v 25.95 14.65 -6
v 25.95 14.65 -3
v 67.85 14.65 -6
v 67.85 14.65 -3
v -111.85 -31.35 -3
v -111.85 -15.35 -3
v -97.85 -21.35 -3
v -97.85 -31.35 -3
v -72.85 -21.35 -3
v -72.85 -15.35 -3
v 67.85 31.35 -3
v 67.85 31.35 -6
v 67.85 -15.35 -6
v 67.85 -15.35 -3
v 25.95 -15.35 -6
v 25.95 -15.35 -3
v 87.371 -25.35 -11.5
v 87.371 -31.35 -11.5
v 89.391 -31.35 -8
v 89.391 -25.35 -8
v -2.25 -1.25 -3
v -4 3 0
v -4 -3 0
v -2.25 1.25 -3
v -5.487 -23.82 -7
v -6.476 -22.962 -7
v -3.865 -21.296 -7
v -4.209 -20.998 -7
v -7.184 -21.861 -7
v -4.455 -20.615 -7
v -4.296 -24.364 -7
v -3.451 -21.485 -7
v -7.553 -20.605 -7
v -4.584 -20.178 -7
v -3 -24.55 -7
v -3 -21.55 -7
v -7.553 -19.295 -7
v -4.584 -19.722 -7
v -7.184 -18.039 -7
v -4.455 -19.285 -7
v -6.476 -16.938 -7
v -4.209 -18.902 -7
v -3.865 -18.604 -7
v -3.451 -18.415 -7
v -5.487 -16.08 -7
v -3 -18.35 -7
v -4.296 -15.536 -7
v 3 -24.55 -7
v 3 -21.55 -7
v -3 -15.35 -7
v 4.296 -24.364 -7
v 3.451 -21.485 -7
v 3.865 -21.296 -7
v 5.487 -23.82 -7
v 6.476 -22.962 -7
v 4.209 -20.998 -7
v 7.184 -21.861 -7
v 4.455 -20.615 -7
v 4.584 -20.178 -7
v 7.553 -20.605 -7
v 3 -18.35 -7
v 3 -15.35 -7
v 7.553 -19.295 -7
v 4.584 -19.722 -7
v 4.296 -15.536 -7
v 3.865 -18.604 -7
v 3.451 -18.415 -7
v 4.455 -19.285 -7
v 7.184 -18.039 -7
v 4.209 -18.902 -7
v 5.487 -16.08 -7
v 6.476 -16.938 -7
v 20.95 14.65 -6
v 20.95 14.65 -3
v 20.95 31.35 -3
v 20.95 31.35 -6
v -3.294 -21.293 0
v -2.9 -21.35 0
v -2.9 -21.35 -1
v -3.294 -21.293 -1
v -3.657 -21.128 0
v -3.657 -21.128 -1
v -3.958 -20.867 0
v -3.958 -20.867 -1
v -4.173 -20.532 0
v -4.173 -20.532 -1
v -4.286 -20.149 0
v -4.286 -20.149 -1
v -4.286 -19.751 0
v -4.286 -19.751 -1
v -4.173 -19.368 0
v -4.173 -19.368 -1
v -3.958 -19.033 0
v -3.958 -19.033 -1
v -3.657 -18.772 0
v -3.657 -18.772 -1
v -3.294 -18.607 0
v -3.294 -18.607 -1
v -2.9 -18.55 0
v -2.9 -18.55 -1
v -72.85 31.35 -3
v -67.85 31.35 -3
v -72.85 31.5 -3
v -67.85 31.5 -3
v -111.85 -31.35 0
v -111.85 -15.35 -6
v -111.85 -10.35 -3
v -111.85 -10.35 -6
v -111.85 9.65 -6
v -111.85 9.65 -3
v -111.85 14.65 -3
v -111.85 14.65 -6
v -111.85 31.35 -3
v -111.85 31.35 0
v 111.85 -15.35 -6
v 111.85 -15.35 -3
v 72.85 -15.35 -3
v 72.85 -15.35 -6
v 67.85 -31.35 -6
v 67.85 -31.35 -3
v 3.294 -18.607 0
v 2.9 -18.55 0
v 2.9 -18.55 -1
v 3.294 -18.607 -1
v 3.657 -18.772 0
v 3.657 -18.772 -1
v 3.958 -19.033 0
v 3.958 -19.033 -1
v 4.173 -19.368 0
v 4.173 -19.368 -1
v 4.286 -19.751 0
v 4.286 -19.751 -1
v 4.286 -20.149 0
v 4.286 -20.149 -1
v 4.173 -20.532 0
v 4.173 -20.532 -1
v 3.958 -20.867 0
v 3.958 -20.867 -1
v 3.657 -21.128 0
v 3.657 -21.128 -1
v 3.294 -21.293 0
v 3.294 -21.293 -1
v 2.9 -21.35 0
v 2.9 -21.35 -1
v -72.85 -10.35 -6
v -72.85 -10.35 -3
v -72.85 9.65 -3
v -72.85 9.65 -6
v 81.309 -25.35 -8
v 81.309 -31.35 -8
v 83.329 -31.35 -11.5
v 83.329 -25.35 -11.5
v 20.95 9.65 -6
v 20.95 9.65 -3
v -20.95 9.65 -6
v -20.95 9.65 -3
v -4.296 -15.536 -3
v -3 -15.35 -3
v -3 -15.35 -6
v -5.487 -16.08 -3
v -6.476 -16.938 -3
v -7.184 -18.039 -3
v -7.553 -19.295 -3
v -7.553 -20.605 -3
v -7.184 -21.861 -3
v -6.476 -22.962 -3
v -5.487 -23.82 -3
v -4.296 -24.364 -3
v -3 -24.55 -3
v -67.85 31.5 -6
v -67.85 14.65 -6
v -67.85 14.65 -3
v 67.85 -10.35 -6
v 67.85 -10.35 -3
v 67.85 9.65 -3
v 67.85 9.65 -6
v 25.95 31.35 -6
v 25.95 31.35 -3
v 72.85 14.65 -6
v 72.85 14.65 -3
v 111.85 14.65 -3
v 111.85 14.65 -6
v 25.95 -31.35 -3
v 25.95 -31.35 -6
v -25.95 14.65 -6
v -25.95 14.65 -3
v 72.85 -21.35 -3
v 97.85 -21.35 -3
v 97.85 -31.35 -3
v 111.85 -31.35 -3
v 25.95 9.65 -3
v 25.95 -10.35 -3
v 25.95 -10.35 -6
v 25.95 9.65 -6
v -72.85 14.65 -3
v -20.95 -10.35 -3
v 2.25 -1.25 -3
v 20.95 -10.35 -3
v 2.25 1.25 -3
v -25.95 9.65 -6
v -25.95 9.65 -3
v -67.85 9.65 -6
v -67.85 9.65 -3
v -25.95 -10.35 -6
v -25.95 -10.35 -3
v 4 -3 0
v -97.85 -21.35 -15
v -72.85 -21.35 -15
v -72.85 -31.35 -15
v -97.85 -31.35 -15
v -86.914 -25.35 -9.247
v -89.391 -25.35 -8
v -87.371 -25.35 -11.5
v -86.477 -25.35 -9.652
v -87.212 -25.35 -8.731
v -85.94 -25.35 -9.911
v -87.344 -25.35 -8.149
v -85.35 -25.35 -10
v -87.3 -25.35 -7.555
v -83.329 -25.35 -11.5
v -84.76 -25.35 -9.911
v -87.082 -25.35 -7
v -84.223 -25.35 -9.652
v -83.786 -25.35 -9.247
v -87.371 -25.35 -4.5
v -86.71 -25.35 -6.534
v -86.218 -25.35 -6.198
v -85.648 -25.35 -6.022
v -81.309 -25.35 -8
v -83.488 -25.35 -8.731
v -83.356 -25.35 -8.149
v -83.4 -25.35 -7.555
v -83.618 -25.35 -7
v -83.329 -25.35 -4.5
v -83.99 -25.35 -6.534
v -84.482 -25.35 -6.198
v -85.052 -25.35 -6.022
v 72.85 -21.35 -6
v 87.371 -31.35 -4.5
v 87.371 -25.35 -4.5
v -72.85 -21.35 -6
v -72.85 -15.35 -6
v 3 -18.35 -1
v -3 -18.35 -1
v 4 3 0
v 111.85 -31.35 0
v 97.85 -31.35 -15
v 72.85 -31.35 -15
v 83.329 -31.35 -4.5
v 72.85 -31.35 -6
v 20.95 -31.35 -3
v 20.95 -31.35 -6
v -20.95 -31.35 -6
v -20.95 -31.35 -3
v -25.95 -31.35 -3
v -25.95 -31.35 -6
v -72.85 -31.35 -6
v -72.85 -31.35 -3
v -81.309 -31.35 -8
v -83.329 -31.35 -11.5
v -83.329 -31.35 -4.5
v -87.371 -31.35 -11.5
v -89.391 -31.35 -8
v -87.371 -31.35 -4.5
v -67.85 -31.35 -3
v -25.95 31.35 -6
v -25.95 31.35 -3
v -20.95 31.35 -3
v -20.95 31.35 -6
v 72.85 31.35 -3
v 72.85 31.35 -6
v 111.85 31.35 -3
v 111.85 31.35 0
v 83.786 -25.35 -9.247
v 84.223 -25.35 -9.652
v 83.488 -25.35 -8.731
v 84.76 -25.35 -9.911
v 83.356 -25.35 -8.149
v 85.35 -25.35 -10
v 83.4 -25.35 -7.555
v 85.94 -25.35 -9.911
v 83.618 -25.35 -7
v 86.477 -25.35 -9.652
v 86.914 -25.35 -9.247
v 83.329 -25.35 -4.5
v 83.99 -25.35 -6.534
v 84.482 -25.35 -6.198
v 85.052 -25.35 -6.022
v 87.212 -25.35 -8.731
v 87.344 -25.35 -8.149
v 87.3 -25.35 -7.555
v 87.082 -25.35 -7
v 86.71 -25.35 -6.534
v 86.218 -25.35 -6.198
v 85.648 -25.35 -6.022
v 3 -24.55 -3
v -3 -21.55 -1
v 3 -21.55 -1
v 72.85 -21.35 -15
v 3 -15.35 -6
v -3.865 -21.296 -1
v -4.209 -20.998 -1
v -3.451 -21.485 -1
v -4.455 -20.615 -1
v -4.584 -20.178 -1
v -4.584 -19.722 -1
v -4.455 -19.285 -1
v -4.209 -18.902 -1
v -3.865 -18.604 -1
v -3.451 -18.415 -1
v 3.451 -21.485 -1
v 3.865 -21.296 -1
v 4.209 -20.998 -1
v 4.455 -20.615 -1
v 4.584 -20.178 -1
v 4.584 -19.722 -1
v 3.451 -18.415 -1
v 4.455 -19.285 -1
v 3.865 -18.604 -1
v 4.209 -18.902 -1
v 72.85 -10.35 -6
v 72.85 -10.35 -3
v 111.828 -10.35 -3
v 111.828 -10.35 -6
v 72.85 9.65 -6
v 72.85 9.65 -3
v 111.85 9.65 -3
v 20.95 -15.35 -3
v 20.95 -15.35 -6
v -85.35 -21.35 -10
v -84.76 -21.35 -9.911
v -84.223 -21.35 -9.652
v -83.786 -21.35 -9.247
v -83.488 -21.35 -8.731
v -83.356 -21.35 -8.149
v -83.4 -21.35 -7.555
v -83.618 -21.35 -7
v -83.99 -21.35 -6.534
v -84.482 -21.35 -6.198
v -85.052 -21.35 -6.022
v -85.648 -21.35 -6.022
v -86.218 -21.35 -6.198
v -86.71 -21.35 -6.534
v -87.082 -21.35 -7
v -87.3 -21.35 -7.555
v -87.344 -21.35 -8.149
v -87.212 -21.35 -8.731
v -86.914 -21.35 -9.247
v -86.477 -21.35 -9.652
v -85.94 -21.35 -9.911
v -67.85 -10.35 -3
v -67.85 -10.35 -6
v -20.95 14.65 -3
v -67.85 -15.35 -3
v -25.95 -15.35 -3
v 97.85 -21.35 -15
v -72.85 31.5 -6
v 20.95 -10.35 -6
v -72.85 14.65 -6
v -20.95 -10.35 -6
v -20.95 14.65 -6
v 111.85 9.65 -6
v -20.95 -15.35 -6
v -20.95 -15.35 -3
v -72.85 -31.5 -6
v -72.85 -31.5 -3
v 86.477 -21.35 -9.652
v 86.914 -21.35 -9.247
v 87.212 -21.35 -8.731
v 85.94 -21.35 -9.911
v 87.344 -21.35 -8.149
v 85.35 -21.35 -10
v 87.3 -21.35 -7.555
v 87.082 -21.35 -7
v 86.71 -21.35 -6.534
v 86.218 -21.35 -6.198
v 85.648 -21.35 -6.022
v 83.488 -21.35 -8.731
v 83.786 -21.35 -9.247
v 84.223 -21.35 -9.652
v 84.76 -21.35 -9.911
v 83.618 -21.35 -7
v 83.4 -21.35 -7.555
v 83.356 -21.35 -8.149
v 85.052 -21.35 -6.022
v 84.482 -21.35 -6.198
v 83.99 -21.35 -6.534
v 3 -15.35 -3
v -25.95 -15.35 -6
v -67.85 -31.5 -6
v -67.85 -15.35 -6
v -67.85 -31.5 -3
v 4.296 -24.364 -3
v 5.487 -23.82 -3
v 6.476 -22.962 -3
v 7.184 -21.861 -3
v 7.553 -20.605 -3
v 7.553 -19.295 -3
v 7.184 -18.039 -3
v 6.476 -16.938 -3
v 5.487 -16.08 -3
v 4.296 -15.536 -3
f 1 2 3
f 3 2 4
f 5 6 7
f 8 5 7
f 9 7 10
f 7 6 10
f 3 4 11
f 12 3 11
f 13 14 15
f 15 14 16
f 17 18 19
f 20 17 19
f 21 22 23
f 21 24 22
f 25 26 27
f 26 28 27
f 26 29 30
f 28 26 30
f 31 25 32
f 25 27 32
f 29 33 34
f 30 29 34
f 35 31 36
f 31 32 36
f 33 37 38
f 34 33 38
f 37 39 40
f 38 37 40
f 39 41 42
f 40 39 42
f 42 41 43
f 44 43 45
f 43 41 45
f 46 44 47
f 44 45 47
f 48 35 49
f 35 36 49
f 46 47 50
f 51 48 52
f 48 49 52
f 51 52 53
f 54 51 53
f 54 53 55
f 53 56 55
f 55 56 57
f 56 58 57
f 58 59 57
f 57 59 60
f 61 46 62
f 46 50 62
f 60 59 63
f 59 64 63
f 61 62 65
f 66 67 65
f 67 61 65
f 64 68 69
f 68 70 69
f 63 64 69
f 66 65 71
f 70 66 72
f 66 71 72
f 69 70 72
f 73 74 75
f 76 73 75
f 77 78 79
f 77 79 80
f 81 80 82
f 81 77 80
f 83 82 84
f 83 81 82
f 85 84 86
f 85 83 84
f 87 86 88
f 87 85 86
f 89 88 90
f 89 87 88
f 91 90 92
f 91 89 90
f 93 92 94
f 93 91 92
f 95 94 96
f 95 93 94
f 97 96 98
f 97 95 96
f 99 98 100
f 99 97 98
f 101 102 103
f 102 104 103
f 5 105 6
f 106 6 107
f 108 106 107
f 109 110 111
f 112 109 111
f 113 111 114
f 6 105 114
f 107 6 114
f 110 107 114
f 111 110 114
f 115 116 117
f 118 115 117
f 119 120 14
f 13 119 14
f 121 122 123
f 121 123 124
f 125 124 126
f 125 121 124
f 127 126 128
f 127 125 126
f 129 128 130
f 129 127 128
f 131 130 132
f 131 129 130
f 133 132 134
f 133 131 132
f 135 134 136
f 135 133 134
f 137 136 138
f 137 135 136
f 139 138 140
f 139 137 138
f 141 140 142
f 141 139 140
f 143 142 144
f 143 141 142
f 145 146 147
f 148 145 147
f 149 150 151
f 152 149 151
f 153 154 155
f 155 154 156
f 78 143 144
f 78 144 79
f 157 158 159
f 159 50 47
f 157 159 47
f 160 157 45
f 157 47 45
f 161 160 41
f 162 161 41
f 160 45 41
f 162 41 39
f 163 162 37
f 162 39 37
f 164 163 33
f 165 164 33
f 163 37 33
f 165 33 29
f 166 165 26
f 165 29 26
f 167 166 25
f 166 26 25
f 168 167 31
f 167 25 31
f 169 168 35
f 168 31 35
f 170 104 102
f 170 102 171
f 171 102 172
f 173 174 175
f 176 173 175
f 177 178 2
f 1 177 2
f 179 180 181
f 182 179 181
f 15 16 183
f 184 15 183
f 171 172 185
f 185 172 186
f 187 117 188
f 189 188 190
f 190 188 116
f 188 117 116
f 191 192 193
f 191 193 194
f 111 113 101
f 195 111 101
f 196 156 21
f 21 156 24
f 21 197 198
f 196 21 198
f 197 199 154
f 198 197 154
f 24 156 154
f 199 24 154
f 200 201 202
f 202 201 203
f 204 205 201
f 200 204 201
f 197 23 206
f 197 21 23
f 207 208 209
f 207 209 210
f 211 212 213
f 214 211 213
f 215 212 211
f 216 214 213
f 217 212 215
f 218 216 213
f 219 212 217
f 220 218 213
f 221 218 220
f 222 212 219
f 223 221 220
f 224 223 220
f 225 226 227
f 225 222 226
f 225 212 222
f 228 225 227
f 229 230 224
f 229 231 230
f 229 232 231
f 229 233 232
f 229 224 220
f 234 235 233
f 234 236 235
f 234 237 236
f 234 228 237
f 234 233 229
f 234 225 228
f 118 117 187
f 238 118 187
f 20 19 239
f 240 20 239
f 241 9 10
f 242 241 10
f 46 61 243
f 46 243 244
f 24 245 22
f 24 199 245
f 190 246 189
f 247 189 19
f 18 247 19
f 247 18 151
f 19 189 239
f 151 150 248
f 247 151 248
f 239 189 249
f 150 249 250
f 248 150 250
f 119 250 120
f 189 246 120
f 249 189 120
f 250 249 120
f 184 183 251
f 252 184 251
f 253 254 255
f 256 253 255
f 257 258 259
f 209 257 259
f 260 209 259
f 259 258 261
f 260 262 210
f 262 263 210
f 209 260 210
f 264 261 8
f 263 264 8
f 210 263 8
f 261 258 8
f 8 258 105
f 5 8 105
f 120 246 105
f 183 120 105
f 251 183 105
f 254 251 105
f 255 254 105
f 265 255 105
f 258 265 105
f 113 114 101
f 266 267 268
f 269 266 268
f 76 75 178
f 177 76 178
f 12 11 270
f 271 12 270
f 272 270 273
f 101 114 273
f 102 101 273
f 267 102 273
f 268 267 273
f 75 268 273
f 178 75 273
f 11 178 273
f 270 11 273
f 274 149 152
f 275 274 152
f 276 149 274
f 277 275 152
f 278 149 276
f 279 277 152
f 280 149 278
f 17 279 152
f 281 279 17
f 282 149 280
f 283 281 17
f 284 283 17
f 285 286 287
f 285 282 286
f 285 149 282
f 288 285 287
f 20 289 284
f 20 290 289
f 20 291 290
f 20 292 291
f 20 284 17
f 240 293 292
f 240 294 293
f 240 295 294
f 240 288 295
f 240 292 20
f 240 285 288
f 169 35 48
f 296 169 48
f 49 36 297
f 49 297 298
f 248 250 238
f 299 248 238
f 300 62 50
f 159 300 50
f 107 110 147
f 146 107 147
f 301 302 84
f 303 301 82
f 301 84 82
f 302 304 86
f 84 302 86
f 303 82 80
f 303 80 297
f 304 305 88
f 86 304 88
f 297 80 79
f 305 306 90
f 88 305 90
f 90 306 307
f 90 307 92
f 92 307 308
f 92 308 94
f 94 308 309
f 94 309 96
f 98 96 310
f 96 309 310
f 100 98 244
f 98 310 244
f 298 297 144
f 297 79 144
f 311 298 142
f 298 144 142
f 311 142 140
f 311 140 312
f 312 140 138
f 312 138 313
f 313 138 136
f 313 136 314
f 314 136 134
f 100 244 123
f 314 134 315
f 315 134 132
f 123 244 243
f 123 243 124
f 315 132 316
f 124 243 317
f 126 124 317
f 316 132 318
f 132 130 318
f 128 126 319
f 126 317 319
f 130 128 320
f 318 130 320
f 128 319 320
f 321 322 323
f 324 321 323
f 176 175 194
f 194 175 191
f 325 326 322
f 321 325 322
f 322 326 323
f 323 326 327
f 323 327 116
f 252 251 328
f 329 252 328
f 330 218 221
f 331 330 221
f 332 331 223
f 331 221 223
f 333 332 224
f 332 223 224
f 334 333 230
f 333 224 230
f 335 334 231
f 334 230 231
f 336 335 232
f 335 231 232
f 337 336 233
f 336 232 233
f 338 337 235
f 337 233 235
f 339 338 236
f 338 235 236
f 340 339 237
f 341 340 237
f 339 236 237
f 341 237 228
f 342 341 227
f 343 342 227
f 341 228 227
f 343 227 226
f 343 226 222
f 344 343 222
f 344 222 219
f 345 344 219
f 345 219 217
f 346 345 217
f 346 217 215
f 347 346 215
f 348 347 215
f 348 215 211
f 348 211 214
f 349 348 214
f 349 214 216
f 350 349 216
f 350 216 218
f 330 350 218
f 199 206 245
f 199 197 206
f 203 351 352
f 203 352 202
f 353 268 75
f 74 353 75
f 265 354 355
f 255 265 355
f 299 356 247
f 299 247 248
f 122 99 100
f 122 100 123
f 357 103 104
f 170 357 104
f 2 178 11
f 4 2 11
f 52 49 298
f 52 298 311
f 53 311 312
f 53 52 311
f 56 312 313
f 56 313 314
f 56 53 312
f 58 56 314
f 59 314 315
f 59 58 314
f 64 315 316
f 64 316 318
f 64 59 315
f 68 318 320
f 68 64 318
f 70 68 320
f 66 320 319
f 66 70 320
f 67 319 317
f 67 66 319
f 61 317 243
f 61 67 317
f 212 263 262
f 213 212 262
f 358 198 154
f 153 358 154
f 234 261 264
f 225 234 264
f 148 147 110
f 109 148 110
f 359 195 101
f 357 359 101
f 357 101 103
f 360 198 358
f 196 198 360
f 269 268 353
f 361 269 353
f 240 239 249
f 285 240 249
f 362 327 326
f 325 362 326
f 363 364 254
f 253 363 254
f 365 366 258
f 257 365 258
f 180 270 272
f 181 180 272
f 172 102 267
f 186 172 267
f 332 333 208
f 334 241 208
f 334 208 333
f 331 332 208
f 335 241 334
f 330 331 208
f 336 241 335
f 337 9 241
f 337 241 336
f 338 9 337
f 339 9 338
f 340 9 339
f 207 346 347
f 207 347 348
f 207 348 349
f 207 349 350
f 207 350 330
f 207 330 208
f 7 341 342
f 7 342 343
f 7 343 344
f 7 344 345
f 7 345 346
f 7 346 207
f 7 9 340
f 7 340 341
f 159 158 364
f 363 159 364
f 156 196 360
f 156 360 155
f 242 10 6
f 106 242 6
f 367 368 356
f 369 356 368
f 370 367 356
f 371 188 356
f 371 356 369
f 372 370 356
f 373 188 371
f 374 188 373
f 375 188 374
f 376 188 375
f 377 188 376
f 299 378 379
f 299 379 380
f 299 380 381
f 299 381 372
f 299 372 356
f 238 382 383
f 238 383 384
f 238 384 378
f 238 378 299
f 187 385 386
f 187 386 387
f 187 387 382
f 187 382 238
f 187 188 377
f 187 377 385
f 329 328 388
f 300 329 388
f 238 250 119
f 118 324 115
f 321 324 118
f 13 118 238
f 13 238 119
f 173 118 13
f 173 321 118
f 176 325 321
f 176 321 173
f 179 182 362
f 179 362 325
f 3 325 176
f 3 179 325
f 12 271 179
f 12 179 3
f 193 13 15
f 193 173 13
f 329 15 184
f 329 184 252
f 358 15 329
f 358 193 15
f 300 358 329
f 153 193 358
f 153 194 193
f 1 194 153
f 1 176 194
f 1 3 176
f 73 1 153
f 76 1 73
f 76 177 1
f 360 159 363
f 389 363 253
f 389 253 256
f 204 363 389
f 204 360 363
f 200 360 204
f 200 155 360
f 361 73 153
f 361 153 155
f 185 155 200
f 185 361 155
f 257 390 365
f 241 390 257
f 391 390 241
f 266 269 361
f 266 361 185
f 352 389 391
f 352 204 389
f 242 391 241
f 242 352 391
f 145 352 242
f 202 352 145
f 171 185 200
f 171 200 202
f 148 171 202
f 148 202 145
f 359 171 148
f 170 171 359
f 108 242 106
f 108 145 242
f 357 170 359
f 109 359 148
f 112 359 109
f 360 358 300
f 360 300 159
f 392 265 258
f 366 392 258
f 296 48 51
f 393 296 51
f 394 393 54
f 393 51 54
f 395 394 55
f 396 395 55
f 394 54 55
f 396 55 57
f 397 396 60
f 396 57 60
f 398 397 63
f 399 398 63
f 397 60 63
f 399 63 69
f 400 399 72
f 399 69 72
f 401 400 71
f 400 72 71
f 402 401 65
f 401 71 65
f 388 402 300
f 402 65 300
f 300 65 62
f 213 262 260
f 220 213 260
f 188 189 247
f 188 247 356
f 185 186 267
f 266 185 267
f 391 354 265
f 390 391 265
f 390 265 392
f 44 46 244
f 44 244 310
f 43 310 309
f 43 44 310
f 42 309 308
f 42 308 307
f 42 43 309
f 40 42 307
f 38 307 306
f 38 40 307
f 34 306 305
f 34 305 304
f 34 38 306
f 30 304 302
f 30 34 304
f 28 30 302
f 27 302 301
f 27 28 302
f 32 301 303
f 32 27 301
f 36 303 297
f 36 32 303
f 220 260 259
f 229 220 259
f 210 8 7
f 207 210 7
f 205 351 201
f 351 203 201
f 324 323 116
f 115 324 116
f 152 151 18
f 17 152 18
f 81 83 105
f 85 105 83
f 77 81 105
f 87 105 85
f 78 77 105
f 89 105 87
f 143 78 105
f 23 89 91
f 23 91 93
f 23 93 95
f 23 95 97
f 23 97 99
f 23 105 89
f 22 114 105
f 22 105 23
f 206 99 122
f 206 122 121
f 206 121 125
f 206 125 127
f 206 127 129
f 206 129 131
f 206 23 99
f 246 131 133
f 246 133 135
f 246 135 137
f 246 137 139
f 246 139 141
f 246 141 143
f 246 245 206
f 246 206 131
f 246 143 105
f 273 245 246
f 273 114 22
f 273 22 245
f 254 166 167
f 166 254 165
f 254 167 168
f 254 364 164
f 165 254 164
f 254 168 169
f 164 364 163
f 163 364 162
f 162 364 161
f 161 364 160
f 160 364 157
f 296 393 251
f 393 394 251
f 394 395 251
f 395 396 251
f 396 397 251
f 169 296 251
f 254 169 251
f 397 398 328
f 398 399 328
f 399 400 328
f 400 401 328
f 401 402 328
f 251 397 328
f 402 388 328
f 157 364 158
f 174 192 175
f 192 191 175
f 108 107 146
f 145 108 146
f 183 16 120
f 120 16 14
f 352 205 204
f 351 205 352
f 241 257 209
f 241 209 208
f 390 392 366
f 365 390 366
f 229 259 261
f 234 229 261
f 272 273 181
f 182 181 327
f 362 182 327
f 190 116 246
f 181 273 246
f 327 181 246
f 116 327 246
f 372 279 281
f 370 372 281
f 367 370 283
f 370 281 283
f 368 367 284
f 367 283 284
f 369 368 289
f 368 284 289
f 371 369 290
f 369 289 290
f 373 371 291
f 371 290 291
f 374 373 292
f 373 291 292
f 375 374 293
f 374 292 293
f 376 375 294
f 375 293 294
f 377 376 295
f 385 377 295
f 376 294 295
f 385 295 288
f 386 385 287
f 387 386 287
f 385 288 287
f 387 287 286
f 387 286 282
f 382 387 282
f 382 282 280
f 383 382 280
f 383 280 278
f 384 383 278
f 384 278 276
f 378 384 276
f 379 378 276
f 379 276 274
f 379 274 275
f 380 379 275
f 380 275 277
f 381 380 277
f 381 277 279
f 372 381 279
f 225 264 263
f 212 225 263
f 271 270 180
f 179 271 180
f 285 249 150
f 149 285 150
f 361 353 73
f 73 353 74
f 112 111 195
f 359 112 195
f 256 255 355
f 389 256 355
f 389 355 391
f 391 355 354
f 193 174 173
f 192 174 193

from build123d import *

# Parameters (mm, degrees)
SKETCH_1_W          = 223.7
SKETCH_1_H          = 62.7
EXTRUDE_1_DEPTH     = 3
CUT_EXTRUDE_1_DEPTH = 1
CUT_EXTRUDE_3_DEPTH = 2
EXTRUDE_START       = 4
EXTRUDE_1_2_DEPTH   = 4
SKETCH_13_W         = 25
SKETCH_13_H         = 10
EXTRUDE_2_DEPTH     = 12
SKETCH_14_W         = 41.9
SKETCH_14_H         = 19.999967379
EXTRUDE_3_DEPTH     = 3
SKETCH_15_R         = 2
CUT_EXTRUDE_4_DEPTH = 10
CUT_EXTRUDE_5_DEPTH = 6


with BuildPart() as part:
    # 草图1 → Extrude 1 (new body)
    with BuildSketch(Plane.XY):
        Rectangle(SKETCH_1_W, SKETCH_1_H)
    extrude(amount=-EXTRUDE_1_DEPTH)

    # 草图2 → 切除-拉伸1 (cut)
    with BuildSketch(Plane.XY):
        with BuildLine():
            Line((-2.9, -18.55), (2.9, -18.55))
            ThreePointArc((2.9, -18.55), (4.3, -19.95), (2.9, -21.35))
            Line((2.9, -21.35), (-2.9, -21.35))
            ThreePointArc((-2.9, -21.35), (-4.3, -19.95), (-2.9, -18.55))
        make_face()
    extrude(amount=-CUT_EXTRUDE_1_DEPTH, mode=Mode.SUBTRACT)

    # 草图5 → 切除-拉伸3 (cut)
    with BuildSketch(Plane(origin=(0, 0, -3), x_dir=(-1, 0, 0), z_dir=(0, 0, -1))):
        with BuildLine():
            Line((3, -21.55), (-3, -21.55))
            ThreePointArc((-3, -21.55), (-4.6, -19.95), (-3, -18.35))
            Line((-3, -18.35), (3, -18.35))
            ThreePointArc((3, -18.35), (4.6, -19.95), (3, -21.55))
        make_face()
    extrude(amount=-CUT_EXTRUDE_3_DEPTH, mode=Mode.SUBTRACT)

    # 草图5<2> → Extrude 1 2 (add)
    with BuildSketch(Plane(origin=(0, 0, -3), x_dir=(-1, 0, 0), z_dir=(0, 0, -1)).offset(EXTRUDE_START)):
        with BuildLine():
            Line((-3, -15.35), (3, -15.35))
            ThreePointArc((3, -15.35), (7.6, -19.95), (3, -24.55))
            Line((3, -24.55), (-3, -24.55))
            ThreePointArc((-3, -24.55), (-7.6, -19.95), (-3, -15.35))
        make_face()
        with BuildLine():
            Line((-3, -18.35), (3, -18.35))
            ThreePointArc((3, -18.35), (4.6, -19.95), (3, -21.55))
            Line((3, -21.55), (-3, -21.55))
            ThreePointArc((-3, -21.55), (-4.6, -19.95), (-3, -18.35))
        make_face(mode=Mode.SUBTRACT)
    extrude(amount=-EXTRUDE_1_2_DEPTH)

    # 草图11 → 切除-放样1 section 0
    with BuildSketch(Plane.XY):
        with BuildLine():
            Line((-4, -3), (4, -3))
            Line((4, -3), (4, 3))
            Line((4, 3), (-4, 3))
            Line((-4, 3), (-4, -3))
        make_face()
    # 草图12 → 切除-放样1 section 1
    with BuildSketch(Plane(origin=(0, 0, -3), x_dir=(-1, 0, 0), z_dir=(0, 0, -1))):
        with BuildLine():
            Line((-2.25, 1.25), (2.25, 1.25))
            Line((2.25, 1.25), (2.25, -1.25))
            Line((2.25, -1.25), (-2.25, -1.25))
            Line((-2.25, -1.25), (-2.25, 1.25))
        make_face()
    loft(mode=Mode.SUBTRACT)

    # 草图13 → 凸台-拉伸2 (add)
    with BuildSketch(Plane(origin=(0, 0, -3), x_dir=(-1, 0, 0), z_dir=(0, 0, -1))):
        with Locations((85.35, -26.35)):
            Rectangle(SKETCH_13_W, SKETCH_13_H)
        with Locations((-85.35, -26.35)):
            Rectangle(SKETCH_13_W, SKETCH_13_H)
    extrude(amount=EXTRUDE_2_DEPTH)

    # 草图14 → 凸台-拉伸3 (add)
    with BuildSketch(Plane(origin=(0, 0, -3), x_dir=(-1, 0, 0), z_dir=(0, 0, -1))):
        Polygon((-111.85, 14.649967379), (-111.85, 9.649967379), (-72.85, 9.649967379), (-72.85, -10.35), (-111.82843297, -10.35), (-111.85, -15.35), (-72.85, -15.35), (-72.85, -31.35), (-67.85, -31.35), (-67.85, -15.35), (-25.95, -15.35), (-25.95, -31.35), (-20.95, -31.35), (-20.95, -15.35), (20.95, -15.35), (20.95, -31.35), (25.95, -31.35), (25.95, -15.35), (67.85, -15.35), (67.85, -31.5), (72.85, -31.5), (72.85, -15.35), (111.85, -15.35), (111.85, -10.35), (72.85, -10.35), (72.85, 9.649967379), (111.85, 9.649967379), (111.85, 14.649967379), (72.85, 14.649967379), (72.85, 31.5), (67.85, 31.5), (67.85, 14.649967379), (25.95, 14.649967379), (25.95, 31.35), (20.95, 31.35), (20.95, 14.649967379), (-20.95, 14.649967379), (-20.95, 31.35), (-25.95, 31.35), (-25.95, 14.649967379), (-67.85, 14.649967379), (-67.85, 31.35), (-72.85, 31.35), (-72.85, 14.649967379), align=None)
        with Locations((-46.9, -0.350016311)):
            Rectangle(SKETCH_14_W, SKETCH_14_H, mode=Mode.SUBTRACT)
        with Locations((0, -0.350016311)):
            Rectangle(SKETCH_14_W, SKETCH_14_H, mode=Mode.SUBTRACT)
        with Locations((46.9, -0.350016311)):
            Rectangle(SKETCH_14_W, SKETCH_14_H, mode=Mode.SUBTRACT)
    extrude(amount=EXTRUDE_3_DEPTH)

    # 草图15 → 切除-拉伸4 (cut)
    with BuildSketch(Plane(origin=(0, -31.35, 0), x_dir=(-1, 0, 0), z_dir=(0, -1, 0))):
        with Locations((85.35, 8)):
            Circle(SKETCH_15_R)
        with Locations((-85.35, 8)):
            Circle(SKETCH_15_R)
    extrude(amount=-CUT_EXTRUDE_4_DEPTH, mode=Mode.SUBTRACT)

    # 草图16 → 切除-拉伸5 (cut)
    with BuildSketch(Plane.XZ.offset(31.35)):
        Polygon((-83.329274058, -11.5), (-81.308548116, -8), (-83.329274058, -4.5), (-87.370725942, -4.5), (-89.391451884, -8), (-87.370725942, -11.5), align=None)
        Polygon((87.370725942, -11.5), (89.391451884, -8), (87.370725942, -4.5), (83.329274058, -4.5), (81.308548116, -8), (83.329274058, -11.5), align=None)
    extrude(amount=-CUT_EXTRUDE_5_DEPTH, mode=Mode.SUBTRACT)


solid = part.part
